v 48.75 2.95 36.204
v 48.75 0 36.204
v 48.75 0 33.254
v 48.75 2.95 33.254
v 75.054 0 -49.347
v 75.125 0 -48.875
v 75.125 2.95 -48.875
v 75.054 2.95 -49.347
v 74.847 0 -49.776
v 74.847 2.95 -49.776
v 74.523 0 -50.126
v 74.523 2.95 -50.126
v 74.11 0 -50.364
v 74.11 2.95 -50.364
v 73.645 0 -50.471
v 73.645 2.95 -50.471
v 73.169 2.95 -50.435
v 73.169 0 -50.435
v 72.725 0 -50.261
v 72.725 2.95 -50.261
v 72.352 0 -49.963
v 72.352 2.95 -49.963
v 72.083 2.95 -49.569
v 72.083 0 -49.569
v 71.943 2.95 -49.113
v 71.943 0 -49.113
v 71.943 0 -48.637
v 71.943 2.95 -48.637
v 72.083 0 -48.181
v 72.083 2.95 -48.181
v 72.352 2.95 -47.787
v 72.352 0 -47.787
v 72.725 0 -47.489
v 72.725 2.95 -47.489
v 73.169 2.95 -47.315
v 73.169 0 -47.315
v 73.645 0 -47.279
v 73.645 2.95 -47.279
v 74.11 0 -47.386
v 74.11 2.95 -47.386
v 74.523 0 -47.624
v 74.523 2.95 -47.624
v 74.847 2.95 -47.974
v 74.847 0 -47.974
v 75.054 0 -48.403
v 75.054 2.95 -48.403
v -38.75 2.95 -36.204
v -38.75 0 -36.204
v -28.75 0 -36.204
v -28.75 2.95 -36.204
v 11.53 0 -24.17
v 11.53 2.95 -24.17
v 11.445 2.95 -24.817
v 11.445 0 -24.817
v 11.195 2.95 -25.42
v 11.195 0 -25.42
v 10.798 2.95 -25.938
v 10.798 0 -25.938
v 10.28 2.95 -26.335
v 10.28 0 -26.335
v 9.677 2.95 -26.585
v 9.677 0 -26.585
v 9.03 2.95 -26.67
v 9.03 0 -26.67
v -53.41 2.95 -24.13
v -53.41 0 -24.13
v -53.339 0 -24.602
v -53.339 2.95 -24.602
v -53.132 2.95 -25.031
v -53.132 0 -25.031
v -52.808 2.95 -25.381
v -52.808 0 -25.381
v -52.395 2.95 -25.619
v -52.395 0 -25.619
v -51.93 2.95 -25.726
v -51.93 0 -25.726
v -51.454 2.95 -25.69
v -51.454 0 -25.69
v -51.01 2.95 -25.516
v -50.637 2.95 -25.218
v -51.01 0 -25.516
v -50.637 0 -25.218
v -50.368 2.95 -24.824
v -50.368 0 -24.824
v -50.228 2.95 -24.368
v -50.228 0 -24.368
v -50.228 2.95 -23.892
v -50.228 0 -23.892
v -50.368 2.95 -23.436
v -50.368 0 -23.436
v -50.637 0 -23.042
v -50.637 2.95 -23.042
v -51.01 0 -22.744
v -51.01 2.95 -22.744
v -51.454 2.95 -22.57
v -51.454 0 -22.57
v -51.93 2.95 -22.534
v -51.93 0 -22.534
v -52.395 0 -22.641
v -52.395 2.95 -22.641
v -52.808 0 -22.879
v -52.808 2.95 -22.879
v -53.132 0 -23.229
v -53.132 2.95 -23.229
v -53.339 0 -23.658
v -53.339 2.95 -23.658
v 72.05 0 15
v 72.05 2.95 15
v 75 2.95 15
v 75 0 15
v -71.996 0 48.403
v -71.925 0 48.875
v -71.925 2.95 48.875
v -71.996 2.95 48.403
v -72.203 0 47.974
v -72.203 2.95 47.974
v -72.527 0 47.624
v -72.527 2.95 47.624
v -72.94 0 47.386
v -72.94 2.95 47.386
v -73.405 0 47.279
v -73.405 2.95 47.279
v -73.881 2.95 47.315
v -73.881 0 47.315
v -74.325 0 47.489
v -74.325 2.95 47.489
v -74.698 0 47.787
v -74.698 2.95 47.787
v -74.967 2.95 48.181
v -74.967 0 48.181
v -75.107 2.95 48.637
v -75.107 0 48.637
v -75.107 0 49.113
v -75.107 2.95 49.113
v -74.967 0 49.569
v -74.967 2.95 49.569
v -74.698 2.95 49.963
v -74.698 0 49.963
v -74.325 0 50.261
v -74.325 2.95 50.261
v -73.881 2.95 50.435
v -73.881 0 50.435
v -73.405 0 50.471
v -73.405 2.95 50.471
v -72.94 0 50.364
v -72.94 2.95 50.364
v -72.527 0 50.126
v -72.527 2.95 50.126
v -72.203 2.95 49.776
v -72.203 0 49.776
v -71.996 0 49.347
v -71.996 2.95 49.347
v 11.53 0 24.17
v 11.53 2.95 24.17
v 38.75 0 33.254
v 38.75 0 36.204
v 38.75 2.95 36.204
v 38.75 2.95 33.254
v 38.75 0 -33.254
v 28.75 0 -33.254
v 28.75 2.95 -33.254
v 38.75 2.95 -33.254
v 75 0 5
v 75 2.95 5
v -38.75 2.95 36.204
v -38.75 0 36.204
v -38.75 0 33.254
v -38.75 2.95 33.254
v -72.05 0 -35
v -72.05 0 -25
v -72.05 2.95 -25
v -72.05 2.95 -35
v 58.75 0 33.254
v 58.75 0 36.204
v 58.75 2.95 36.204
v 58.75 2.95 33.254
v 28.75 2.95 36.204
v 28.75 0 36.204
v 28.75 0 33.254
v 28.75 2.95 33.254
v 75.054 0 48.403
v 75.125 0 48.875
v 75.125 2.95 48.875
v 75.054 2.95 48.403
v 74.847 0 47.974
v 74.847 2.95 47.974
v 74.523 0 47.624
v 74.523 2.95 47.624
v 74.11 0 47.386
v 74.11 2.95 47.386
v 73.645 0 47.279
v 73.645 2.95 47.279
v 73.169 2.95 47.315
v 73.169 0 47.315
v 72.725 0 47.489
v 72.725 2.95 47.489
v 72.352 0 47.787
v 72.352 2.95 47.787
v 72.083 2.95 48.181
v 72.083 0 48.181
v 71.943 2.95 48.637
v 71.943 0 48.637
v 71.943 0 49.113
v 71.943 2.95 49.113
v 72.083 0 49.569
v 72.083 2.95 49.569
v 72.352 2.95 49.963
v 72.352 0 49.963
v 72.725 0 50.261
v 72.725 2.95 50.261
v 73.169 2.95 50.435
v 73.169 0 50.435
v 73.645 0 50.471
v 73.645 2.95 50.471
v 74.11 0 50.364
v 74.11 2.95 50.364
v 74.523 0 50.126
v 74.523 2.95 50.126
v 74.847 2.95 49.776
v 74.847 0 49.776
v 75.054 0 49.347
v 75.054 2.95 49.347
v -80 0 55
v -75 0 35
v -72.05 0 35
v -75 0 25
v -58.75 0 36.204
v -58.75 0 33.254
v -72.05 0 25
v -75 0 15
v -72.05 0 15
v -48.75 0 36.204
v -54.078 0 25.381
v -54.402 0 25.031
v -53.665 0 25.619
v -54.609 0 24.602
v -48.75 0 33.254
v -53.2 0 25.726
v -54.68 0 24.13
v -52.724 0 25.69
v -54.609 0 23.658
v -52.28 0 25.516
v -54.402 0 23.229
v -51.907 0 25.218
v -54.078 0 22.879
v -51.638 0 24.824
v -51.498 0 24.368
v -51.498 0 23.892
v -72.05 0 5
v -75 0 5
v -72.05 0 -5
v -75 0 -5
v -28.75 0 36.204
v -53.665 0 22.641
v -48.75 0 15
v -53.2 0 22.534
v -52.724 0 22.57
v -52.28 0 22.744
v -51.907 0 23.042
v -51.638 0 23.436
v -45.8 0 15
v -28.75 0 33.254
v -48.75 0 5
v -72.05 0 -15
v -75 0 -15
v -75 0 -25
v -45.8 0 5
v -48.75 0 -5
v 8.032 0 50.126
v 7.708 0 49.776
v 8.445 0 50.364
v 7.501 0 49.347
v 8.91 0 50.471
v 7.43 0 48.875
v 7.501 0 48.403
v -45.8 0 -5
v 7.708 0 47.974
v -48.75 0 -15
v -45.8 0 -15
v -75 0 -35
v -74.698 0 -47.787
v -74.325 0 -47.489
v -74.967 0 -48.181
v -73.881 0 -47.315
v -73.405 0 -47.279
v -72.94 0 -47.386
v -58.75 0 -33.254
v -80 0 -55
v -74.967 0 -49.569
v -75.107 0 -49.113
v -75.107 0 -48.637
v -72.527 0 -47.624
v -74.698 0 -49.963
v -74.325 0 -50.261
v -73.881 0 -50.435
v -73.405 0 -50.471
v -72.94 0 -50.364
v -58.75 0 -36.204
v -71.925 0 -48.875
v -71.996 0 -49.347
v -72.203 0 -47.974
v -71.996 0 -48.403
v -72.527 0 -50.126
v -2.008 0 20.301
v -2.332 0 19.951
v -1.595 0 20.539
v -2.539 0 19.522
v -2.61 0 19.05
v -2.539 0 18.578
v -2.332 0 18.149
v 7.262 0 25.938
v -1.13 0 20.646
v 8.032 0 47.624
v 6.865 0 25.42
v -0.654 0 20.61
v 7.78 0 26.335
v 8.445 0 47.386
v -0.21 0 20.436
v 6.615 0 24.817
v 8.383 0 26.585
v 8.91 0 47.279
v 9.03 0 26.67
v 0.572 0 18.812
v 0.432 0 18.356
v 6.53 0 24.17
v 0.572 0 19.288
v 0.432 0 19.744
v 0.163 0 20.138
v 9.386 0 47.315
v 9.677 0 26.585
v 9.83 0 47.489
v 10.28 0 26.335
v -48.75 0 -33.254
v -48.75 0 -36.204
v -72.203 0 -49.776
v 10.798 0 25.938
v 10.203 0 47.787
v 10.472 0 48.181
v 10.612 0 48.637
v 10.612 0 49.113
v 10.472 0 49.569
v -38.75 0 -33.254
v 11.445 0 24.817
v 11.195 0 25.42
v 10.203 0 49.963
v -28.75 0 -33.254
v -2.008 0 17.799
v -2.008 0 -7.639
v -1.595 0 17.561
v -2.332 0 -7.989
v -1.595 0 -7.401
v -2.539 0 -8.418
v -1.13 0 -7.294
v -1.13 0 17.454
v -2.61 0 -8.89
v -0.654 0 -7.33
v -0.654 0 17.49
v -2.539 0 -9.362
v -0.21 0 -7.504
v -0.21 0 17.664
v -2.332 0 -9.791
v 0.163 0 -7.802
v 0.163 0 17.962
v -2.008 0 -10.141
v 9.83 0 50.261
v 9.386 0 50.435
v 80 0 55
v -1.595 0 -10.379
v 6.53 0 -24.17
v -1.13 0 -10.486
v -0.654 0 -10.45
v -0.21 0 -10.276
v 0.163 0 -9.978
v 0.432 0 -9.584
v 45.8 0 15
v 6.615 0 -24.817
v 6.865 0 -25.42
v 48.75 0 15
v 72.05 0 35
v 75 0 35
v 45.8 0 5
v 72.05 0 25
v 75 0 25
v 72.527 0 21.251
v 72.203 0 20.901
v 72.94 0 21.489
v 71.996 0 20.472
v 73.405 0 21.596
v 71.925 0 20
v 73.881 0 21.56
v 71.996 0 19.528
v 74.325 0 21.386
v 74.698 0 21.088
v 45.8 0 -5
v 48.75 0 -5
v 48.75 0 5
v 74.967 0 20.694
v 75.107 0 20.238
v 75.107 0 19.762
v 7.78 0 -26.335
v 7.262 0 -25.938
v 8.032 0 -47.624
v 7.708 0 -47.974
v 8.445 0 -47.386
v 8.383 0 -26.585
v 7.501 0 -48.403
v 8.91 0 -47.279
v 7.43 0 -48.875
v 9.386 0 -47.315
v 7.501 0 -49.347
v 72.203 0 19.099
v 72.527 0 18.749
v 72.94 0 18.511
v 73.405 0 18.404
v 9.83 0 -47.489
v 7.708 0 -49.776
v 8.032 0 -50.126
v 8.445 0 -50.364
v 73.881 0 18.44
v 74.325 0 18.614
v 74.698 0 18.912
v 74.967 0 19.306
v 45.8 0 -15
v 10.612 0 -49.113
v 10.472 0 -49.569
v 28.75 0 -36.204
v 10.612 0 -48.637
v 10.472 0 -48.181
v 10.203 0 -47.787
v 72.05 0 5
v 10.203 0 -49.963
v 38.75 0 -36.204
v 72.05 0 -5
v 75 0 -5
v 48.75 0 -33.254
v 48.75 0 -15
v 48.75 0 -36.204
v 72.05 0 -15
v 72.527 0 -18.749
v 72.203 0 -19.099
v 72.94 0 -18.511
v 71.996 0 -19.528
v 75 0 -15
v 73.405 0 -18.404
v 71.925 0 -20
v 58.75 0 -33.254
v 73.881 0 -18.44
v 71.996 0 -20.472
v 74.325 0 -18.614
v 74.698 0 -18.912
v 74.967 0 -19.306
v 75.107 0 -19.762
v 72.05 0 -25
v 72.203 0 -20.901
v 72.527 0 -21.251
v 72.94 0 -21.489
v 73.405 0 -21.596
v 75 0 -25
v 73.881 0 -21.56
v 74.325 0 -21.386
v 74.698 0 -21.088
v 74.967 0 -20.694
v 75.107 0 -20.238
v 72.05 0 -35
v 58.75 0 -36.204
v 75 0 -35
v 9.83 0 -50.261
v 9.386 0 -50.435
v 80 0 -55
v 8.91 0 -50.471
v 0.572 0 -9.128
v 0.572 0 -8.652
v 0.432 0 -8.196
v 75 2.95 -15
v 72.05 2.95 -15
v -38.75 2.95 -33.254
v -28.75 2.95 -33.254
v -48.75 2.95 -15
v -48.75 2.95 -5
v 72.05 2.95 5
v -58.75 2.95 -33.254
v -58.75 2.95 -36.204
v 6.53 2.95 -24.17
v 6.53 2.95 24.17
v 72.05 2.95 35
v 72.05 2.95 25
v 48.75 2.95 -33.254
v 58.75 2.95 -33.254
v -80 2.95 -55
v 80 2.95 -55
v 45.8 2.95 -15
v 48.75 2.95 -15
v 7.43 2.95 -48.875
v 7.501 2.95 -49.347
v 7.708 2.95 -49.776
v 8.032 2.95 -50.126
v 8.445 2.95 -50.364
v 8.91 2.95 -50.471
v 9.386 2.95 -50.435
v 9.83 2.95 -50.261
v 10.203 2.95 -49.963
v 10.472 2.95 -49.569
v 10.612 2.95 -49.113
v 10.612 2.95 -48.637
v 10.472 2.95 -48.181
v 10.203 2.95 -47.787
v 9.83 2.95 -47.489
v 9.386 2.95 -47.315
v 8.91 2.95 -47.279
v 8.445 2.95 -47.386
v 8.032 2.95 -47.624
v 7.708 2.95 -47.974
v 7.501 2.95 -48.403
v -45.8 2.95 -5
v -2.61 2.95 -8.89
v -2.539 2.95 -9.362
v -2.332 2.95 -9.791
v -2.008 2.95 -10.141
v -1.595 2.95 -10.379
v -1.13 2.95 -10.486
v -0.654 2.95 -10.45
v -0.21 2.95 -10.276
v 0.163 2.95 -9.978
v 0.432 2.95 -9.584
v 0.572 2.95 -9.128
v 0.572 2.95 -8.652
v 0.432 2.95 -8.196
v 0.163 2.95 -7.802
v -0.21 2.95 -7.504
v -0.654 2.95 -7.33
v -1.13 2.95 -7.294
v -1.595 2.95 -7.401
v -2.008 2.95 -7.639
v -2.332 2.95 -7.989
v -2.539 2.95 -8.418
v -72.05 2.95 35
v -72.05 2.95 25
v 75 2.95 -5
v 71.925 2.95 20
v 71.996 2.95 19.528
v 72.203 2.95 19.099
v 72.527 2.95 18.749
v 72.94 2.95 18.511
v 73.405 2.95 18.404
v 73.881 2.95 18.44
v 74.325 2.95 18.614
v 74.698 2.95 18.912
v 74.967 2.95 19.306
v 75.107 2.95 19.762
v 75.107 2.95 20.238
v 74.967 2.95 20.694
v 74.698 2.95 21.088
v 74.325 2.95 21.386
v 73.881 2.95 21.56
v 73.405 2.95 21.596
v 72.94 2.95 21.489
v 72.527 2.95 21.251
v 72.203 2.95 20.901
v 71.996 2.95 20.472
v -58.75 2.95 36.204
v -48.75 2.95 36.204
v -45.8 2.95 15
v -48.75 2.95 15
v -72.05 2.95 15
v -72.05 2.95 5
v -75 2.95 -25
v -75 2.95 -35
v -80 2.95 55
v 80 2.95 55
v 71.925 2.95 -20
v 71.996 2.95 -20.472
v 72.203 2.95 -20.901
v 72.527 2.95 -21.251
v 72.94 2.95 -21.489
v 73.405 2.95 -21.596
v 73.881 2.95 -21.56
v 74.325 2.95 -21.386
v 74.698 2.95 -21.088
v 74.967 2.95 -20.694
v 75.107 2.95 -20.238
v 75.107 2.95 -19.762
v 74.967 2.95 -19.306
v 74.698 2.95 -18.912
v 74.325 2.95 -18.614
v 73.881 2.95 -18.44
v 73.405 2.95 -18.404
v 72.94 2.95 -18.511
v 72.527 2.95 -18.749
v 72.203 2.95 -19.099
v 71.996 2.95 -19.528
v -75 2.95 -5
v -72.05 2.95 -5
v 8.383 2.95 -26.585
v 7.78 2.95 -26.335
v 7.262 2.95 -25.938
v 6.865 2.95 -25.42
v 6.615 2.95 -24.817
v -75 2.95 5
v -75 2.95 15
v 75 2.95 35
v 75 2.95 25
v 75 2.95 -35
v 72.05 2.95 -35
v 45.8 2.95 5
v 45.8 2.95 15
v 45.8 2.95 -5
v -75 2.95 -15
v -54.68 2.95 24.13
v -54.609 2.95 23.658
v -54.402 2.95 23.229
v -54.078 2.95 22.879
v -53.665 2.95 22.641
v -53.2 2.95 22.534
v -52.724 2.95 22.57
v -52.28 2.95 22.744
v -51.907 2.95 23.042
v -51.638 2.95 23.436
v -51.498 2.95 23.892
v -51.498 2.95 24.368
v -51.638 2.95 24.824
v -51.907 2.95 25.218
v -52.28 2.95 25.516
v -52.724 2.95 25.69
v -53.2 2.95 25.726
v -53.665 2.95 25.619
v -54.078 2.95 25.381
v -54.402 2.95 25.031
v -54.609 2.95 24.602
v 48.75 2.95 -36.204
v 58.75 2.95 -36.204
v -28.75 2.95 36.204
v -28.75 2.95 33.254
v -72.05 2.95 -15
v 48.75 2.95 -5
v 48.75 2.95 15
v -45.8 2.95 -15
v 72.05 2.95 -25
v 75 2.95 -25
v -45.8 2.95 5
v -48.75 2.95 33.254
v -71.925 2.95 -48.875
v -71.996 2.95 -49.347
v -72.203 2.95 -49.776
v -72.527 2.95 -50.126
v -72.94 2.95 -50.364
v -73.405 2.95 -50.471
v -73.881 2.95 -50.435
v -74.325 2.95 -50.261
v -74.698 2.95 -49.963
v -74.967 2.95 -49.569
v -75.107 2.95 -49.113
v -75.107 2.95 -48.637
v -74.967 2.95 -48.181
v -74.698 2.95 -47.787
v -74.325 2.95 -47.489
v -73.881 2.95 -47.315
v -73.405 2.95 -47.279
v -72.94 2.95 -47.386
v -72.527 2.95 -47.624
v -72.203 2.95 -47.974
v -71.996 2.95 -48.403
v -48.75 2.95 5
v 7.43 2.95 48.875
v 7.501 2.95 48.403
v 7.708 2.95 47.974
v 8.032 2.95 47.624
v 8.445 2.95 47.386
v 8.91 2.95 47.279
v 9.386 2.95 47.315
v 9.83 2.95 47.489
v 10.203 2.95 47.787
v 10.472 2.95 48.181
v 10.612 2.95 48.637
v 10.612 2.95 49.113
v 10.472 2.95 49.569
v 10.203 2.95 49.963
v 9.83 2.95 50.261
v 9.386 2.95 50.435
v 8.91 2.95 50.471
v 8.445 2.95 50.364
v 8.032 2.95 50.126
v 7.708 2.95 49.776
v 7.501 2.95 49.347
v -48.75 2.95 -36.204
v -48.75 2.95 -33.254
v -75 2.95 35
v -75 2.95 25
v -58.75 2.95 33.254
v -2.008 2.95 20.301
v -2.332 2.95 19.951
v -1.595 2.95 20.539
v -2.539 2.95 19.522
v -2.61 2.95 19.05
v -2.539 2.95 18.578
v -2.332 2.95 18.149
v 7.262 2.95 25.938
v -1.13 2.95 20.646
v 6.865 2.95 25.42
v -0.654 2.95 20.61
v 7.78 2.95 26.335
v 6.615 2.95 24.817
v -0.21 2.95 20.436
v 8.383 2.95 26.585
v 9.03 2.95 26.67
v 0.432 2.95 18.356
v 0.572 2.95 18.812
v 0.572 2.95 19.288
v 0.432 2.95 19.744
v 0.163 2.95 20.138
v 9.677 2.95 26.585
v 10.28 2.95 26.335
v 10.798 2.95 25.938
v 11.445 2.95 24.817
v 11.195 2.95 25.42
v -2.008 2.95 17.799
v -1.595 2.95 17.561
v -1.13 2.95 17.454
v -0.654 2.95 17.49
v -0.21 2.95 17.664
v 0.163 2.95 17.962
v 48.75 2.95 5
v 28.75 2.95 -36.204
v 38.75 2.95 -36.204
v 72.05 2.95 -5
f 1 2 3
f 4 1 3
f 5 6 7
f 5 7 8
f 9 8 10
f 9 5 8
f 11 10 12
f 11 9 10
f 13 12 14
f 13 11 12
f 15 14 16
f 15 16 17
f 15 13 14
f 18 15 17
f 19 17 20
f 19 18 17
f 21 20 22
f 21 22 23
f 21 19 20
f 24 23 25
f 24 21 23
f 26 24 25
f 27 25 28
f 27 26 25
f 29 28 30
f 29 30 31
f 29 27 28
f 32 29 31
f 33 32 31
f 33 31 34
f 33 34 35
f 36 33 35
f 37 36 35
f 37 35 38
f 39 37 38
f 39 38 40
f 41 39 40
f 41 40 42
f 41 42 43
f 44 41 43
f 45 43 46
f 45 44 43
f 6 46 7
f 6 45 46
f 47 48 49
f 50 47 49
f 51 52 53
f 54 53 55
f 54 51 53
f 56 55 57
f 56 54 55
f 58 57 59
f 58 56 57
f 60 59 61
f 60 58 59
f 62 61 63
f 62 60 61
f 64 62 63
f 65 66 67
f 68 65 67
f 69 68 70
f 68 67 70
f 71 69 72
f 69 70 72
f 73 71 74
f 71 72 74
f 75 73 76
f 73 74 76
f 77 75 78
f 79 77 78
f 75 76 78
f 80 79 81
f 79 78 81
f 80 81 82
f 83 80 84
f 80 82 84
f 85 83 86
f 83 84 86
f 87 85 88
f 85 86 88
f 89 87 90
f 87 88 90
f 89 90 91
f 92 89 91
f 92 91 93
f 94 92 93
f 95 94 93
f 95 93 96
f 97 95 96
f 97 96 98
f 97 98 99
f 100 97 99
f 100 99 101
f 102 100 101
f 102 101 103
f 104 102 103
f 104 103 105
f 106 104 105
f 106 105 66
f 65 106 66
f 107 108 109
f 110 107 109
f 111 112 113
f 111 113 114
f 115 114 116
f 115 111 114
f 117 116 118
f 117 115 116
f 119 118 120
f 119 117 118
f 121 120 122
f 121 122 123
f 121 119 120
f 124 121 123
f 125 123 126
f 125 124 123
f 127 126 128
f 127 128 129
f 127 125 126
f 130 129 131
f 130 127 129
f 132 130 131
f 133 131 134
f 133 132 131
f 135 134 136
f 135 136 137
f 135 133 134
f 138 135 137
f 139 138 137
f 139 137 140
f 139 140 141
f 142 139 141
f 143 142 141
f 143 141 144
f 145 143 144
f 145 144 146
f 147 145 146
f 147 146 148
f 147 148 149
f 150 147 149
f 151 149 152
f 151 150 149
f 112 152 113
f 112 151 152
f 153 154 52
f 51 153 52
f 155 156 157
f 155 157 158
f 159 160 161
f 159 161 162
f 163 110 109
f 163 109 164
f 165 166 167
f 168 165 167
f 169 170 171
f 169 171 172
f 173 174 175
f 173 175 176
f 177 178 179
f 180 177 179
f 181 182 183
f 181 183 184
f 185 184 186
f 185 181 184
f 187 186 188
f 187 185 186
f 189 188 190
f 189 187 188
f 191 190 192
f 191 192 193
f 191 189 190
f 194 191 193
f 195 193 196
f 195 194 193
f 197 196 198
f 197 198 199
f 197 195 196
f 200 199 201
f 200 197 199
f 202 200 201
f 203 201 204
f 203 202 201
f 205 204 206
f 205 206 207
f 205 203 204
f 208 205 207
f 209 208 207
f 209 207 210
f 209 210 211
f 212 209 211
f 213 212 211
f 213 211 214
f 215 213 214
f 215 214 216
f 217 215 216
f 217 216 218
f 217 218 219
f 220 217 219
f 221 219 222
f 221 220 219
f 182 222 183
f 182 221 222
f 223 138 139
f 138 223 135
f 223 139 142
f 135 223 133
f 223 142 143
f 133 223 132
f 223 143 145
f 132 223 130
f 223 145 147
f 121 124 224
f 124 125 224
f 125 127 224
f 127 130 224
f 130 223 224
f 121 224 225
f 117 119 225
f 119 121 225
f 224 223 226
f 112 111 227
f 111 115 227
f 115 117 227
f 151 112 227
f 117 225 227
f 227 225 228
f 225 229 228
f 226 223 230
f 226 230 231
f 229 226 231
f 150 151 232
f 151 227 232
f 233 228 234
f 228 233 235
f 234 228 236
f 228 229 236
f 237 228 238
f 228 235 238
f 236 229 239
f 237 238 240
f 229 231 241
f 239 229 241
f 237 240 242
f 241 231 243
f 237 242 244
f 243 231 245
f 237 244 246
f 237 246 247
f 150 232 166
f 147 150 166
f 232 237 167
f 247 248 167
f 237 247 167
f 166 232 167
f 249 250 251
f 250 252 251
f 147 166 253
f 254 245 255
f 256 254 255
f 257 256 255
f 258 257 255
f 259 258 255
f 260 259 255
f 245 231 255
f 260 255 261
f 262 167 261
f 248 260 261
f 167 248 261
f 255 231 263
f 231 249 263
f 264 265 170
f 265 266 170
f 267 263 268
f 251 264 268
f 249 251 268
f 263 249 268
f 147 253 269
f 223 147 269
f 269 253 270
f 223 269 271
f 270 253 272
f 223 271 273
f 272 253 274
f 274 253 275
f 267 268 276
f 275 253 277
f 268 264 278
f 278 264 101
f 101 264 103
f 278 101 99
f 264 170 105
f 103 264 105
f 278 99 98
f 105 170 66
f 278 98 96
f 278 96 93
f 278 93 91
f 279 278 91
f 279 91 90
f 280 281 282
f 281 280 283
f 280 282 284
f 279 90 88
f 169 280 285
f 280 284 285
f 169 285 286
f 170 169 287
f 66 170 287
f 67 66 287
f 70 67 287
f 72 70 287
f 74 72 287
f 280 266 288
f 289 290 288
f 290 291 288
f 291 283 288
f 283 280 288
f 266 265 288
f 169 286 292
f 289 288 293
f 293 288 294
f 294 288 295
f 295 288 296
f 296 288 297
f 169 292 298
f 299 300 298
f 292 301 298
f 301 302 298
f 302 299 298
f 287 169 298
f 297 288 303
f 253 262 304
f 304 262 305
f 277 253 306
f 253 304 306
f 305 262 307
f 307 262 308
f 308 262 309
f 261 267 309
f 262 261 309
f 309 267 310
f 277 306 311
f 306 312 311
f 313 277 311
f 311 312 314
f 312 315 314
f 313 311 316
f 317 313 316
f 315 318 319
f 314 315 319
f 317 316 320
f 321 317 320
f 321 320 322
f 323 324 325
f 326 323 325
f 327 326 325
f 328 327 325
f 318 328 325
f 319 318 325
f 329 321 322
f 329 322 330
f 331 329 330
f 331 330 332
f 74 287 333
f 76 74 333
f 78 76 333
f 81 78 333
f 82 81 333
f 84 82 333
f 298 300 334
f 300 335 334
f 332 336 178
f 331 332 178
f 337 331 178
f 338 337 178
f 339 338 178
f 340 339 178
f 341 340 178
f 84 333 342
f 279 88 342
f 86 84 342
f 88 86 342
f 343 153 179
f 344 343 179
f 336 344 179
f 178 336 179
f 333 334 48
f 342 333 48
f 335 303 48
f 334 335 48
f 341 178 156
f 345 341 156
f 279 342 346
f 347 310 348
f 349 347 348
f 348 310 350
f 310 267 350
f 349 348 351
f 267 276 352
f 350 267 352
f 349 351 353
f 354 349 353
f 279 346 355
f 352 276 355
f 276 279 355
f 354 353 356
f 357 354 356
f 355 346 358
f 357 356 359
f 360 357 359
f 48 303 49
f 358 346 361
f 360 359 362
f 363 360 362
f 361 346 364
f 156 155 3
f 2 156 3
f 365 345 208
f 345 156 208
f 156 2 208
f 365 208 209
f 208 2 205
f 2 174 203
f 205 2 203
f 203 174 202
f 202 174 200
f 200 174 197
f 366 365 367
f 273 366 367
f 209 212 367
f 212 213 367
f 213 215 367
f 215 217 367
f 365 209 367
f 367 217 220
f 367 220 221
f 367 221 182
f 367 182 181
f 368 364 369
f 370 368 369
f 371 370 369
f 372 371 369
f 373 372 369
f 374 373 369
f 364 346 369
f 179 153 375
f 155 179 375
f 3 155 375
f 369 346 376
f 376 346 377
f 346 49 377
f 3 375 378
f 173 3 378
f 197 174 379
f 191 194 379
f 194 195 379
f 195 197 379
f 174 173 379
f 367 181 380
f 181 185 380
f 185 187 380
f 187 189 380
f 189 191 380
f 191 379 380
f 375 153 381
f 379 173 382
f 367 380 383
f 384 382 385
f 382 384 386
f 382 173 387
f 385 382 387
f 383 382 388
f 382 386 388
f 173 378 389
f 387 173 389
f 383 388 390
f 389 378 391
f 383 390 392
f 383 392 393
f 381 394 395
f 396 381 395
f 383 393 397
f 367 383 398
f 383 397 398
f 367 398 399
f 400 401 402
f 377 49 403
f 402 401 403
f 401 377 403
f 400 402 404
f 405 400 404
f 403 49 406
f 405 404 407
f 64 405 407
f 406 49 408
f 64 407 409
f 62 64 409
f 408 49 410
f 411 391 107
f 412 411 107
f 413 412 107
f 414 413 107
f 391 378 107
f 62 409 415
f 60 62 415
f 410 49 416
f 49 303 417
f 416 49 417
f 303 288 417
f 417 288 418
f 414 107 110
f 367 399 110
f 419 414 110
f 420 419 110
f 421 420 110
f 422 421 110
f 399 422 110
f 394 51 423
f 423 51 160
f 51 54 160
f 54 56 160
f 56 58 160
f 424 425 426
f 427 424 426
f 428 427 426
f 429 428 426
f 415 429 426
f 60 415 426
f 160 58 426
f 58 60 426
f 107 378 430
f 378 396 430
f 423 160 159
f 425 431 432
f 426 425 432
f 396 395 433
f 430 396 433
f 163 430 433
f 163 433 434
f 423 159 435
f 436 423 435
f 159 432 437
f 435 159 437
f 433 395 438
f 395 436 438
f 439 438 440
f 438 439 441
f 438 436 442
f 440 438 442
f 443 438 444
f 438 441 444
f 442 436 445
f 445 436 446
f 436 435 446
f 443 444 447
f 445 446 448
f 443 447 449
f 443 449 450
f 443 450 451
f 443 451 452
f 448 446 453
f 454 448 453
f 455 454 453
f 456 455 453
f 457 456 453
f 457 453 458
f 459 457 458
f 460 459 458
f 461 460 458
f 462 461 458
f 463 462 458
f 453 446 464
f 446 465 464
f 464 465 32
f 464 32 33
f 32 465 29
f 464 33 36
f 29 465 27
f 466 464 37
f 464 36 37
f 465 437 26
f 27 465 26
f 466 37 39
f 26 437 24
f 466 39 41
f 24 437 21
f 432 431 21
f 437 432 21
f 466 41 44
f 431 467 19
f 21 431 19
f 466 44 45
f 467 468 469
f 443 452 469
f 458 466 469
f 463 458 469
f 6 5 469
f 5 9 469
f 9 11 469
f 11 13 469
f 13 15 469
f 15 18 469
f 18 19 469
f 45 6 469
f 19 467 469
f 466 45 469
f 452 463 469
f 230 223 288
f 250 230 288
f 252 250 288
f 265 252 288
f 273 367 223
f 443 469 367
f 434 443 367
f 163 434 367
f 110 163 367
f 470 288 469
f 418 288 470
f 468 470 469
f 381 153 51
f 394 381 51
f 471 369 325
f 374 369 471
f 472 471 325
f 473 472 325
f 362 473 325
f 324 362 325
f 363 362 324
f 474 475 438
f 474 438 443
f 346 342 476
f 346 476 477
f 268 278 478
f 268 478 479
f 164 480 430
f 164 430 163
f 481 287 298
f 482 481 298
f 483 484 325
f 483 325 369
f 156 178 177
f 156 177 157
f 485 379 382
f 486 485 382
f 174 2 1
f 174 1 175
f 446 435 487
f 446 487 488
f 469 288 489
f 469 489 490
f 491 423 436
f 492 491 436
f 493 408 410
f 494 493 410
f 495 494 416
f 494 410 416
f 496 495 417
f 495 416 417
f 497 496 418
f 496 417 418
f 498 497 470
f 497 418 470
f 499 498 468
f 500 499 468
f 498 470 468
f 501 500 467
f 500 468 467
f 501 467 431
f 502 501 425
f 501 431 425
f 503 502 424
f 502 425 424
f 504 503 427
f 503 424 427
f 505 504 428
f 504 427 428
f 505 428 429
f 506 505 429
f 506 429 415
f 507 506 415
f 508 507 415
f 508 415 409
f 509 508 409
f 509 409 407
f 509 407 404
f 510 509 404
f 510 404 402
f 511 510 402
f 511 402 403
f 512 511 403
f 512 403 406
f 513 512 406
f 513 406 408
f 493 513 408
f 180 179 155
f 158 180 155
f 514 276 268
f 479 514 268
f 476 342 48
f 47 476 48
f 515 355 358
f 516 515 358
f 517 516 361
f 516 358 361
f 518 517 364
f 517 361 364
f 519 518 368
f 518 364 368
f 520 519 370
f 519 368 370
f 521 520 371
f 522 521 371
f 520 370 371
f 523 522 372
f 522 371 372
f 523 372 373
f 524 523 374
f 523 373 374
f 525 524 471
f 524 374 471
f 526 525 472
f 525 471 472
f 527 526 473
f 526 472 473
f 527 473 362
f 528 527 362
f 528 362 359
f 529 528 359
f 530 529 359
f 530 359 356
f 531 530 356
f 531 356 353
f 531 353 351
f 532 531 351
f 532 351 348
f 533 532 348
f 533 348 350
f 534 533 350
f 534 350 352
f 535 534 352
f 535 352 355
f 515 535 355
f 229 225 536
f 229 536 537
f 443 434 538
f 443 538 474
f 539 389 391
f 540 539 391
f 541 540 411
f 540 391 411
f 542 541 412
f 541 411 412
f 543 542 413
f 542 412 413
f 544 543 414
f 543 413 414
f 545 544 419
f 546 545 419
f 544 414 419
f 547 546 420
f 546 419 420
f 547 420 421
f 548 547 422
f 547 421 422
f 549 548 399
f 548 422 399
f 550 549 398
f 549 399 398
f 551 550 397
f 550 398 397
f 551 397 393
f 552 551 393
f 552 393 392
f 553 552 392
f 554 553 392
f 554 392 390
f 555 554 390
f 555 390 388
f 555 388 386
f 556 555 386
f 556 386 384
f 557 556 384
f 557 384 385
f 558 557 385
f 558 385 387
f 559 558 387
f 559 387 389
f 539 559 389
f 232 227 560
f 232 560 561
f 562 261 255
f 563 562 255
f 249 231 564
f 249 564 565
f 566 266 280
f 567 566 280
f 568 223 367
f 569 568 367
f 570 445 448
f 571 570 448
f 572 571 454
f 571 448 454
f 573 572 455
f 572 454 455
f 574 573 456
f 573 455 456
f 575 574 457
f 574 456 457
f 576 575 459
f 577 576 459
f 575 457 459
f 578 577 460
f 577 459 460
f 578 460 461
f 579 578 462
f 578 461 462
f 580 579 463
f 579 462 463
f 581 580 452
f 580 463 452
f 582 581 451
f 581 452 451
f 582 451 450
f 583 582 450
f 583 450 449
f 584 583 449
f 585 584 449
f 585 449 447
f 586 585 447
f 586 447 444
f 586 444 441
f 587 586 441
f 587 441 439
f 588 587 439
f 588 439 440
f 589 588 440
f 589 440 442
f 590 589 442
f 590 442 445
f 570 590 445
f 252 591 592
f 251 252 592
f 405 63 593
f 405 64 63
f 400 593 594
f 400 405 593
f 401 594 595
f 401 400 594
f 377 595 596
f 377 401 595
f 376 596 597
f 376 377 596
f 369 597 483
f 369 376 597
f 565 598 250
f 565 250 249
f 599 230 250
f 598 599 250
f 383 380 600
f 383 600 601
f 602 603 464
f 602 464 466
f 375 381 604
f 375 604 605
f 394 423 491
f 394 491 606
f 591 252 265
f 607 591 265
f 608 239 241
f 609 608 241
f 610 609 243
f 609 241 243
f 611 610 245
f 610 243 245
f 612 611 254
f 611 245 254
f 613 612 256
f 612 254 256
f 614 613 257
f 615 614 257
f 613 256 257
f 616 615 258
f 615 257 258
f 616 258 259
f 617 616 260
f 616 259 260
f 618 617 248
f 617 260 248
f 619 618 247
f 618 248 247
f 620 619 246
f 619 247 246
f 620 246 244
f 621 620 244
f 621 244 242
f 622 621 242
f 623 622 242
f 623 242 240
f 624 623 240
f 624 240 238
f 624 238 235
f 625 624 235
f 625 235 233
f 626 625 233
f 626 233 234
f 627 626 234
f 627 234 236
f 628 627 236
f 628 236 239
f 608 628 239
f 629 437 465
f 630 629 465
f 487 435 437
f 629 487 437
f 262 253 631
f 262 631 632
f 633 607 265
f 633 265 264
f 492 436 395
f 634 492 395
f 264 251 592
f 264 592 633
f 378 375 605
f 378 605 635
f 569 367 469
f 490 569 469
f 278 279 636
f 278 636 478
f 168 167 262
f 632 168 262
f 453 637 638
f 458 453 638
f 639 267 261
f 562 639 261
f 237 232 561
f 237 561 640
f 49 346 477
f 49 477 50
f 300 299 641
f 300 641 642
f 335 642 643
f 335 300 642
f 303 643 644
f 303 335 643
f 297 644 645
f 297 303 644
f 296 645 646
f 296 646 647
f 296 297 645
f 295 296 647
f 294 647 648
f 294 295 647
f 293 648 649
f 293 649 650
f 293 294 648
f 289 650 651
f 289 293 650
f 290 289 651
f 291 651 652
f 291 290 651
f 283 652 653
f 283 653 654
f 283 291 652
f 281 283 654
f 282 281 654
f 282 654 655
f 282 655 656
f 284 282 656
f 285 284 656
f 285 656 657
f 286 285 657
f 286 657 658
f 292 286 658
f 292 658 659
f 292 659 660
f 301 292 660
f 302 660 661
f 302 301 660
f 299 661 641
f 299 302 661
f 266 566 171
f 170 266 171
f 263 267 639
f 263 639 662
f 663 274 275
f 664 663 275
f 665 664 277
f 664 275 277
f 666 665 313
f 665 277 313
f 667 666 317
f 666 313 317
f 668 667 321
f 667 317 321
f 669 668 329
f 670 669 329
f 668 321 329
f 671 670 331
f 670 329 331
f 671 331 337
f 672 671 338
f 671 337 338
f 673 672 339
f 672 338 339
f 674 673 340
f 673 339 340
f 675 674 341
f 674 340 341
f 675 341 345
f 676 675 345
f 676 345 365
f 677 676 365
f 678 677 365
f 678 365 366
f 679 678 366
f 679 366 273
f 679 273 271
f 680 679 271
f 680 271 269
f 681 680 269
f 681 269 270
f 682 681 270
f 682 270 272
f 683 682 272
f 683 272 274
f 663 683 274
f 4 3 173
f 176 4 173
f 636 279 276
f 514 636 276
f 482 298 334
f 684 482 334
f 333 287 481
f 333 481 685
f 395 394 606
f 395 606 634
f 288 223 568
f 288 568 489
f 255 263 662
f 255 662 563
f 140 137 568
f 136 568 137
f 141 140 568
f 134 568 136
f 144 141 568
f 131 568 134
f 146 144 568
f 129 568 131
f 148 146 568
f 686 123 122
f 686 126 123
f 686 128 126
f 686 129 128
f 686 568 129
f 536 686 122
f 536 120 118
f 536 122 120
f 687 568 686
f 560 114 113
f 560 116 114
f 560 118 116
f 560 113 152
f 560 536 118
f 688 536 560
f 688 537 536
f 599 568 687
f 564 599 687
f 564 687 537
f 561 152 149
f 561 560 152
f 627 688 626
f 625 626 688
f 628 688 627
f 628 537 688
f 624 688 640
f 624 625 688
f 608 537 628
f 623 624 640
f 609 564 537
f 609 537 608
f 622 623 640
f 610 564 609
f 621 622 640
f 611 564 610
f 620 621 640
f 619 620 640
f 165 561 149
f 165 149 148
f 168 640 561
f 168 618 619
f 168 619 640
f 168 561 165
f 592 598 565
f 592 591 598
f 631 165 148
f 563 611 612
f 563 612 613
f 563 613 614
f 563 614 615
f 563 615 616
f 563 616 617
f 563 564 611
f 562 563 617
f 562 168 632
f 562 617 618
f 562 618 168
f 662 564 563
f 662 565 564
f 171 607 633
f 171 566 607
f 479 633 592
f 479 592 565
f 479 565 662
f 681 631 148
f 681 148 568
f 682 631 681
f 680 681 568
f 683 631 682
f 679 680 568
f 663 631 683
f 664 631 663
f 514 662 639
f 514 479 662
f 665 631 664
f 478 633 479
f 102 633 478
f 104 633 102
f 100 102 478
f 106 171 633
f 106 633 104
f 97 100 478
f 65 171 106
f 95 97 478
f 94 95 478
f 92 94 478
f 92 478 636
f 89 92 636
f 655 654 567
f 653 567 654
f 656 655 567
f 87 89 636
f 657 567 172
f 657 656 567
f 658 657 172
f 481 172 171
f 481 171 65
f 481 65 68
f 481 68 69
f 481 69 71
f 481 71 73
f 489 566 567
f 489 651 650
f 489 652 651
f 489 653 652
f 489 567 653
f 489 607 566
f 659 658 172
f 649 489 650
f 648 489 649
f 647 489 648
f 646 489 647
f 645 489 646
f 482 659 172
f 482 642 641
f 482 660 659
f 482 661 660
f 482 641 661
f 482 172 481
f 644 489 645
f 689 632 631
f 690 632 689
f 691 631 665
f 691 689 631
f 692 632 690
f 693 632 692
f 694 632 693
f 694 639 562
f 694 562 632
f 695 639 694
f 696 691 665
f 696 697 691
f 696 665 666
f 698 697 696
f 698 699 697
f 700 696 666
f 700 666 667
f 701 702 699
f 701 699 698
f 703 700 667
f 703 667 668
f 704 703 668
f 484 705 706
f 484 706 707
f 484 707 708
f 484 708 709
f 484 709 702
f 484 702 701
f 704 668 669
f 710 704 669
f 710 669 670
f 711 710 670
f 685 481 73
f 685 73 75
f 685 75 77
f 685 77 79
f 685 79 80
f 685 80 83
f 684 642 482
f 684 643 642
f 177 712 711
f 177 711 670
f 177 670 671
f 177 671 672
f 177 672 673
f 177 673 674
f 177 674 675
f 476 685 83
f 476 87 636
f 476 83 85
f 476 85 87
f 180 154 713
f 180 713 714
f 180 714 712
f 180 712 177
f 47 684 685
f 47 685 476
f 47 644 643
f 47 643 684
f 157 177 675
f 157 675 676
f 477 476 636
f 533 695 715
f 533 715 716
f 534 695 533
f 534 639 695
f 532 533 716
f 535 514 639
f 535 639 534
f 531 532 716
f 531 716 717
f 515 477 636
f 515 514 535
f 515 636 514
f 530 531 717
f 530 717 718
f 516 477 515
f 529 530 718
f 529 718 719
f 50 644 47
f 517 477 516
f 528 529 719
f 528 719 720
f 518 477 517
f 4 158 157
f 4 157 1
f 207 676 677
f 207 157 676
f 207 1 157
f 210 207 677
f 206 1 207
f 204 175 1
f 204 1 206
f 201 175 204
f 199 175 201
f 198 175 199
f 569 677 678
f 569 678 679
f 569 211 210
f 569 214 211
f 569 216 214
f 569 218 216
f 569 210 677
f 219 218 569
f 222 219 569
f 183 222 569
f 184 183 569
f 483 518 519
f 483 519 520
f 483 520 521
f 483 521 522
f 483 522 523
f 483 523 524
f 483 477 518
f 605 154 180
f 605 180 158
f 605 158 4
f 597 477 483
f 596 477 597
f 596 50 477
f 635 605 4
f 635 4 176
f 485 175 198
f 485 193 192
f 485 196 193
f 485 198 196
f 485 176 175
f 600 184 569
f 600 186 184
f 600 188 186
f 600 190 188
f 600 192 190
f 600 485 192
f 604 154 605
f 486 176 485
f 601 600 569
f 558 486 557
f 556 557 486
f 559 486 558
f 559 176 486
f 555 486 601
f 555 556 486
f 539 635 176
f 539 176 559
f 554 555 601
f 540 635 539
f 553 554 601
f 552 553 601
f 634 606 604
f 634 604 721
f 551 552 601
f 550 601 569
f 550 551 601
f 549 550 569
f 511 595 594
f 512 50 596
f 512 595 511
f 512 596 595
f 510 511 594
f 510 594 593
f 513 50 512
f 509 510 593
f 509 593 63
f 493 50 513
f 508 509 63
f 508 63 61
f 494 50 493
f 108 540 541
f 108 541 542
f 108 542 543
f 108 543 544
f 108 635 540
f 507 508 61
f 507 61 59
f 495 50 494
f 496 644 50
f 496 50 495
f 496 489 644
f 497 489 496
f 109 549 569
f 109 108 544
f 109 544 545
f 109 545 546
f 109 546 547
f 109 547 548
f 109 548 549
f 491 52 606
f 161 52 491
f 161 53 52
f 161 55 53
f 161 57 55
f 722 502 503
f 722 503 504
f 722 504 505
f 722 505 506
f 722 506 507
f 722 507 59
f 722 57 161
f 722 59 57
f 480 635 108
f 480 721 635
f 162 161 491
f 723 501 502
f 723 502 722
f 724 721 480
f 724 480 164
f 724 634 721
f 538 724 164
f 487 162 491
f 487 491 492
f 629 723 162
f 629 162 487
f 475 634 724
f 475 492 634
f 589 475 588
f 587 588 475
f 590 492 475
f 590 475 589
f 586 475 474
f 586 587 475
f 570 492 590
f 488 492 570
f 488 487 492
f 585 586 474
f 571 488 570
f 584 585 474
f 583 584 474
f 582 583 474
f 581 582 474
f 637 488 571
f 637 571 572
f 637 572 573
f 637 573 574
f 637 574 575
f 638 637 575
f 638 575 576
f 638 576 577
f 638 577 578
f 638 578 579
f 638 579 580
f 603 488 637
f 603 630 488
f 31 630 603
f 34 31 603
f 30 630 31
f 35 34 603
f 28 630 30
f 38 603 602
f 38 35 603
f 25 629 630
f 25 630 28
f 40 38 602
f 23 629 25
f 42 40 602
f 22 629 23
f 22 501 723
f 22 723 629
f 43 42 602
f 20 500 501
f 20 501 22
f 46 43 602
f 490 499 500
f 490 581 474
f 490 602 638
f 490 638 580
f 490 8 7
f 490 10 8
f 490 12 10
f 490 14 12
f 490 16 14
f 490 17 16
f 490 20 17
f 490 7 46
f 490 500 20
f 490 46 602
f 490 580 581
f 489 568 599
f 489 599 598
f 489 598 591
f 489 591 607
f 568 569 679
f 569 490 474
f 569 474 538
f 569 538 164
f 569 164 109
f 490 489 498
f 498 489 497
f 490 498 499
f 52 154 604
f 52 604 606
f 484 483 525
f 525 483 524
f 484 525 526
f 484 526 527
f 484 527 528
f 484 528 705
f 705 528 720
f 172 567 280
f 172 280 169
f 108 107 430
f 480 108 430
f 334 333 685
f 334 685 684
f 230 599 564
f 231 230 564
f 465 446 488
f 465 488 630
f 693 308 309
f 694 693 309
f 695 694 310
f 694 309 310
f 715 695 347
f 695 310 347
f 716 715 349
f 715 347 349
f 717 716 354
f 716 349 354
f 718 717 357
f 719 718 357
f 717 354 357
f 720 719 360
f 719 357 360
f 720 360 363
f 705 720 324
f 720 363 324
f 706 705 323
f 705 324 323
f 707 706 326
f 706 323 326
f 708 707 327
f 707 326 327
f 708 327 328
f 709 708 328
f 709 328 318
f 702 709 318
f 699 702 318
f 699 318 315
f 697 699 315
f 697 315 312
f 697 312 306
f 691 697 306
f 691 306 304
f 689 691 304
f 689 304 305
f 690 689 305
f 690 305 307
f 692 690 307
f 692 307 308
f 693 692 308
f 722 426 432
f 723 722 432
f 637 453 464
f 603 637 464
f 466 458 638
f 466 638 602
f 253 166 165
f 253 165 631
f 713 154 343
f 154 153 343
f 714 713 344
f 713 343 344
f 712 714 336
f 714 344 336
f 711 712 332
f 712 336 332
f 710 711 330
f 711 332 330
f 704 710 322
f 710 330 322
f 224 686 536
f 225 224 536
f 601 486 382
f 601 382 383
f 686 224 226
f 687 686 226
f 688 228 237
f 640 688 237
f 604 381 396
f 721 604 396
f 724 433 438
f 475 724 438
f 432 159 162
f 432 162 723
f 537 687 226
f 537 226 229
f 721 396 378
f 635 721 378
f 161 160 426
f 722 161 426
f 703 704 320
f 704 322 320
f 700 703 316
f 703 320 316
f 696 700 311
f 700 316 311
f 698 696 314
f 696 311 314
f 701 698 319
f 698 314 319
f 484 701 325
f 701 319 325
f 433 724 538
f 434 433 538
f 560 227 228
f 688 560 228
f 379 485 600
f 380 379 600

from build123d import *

# Parameters (mm, degrees)
BOTTOM_PLATE_OUTLINE_W   = 160
BOTTOM_PLATE_OUTLINE_H   = 110
BOTTOM_PLATE_OUTLINE_R   = 1.6
BOTTOM_PLATE_OUTLINE_W_2 = 2.95
BOTTOM_PLATE_OUTLINE_H_2 = 10
BOTTOM_PLATE_OUTLINE_W_3 = 10
BOTTOM_PLATE_OUTLINE_H_3 = 2.95
BOTTOM_PLATE_DEPTH       = 2.95
M3_CLEARANCE_HOLE1_D     = 3.2
SKETCH6_W                = 5
SKETCH6_H                = 53.34
CUT_EXTRUDE1_DEPTH       = 98.127249009
FILLET1_R                = 2.5
FILLET2_R                = 2.5
M3_CLEARANCE_HOLE2_D     = 3.2
M3_CLEARANCE_HOLE3_D     = 3.2
SKETCH12_W               = 2.95
SKETCH12_H               = 10
CUT_EXTRUDE4_DEPTH       = 98.127249009


# Read off the part's stored shape, not the designer's step: Bottom Plate
with BuildPart() as part:
    # Bottom Plate outline → Bottom Plate (new body)
    with BuildSketch(Plane(origin=(0, 0, 0), x_dir=(1, 0, 0), z_dir=(0, 1, 0))):
        Rectangle(BOTTOM_PLATE_OUTLINE_W, BOTTOM_PLATE_OUTLINE_H)
        with Locations((-73.525, -48.875)):
            Circle(BOTTOM_PLATE_OUTLINE_R, mode=Mode.SUBTRACT)
        with Locations((-73.525, -30)):
            Rectangle(BOTTOM_PLATE_OUTLINE_W_2, BOTTOM_PLATE_OUTLINE_H_2, mode=Mode.SUBTRACT)
        with Locations((-53.75, -34.729)):
            Rectangle(BOTTOM_PLATE_OUTLINE_W_3, BOTTOM_PLATE_OUTLINE_H_3, mode=Mode.SUBTRACT)
        with Locations((-33.75, -34.729)):
            Rectangle(BOTTOM_PLATE_OUTLINE_W_3, BOTTOM_PLATE_OUTLINE_H_3, mode=Mode.SUBTRACT)
        with Locations((-73.525, -10)):
            Rectangle(BOTTOM_PLATE_OUTLINE_W_2, BOTTOM_PLATE_OUTLINE_H_2, mode=Mode.SUBTRACT)
        with Locations((33.75, -34.729)):
            Rectangle(BOTTOM_PLATE_OUTLINE_W_3, BOTTOM_PLATE_OUTLINE_H_3, mode=Mode.SUBTRACT)
        with Locations((73.525, -48.875)):
            Circle(BOTTOM_PLATE_OUTLINE_R, mode=Mode.SUBTRACT)
        with Locations((53.75, -34.729)):
            Rectangle(BOTTOM_PLATE_OUTLINE_W_3, BOTTOM_PLATE_OUTLINE_H_3, mode=Mode.SUBTRACT)
        with Locations((73.525, -30)):
            Rectangle(BOTTOM_PLATE_OUTLINE_W_2, BOTTOM_PLATE_OUTLINE_H_2, mode=Mode.SUBTRACT)
        with Locations((73.525, -10)):
            Rectangle(BOTTOM_PLATE_OUTLINE_W_2, BOTTOM_PLATE_OUTLINE_H_2, mode=Mode.SUBTRACT)
        with Locations((-73.525, 10)):
            Rectangle(BOTTOM_PLATE_OUTLINE_W_2, BOTTOM_PLATE_OUTLINE_H_2, mode=Mode.SUBTRACT)
        with Locations((-73.525, 30)):
            Rectangle(BOTTOM_PLATE_OUTLINE_W_2, BOTTOM_PLATE_OUTLINE_H_2, mode=Mode.SUBTRACT)
        with Locations((-53.75, 34.729)):
            Rectangle(BOTTOM_PLATE_OUTLINE_W_3, BOTTOM_PLATE_OUTLINE_H_3, mode=Mode.SUBTRACT)
        with Locations((-73.525, 48.875)):
            Circle(BOTTOM_PLATE_OUTLINE_R, mode=Mode.SUBTRACT)
        with Locations((-33.75, 34.729)):
            Rectangle(BOTTOM_PLATE_OUTLINE_W_3, BOTTOM_PLATE_OUTLINE_H_3, mode=Mode.SUBTRACT)
        with Locations((73.525, 10)):
            Rectangle(BOTTOM_PLATE_OUTLINE_W_2, BOTTOM_PLATE_OUTLINE_H_2, mode=Mode.SUBTRACT)
        with Locations((33.75, 34.729)):
            Rectangle(BOTTOM_PLATE_OUTLINE_W_3, BOTTOM_PLATE_OUTLINE_H_3, mode=Mode.SUBTRACT)
        with Locations((53.75, 34.729)):
            Rectangle(BOTTOM_PLATE_OUTLINE_W_3, BOTTOM_PLATE_OUTLINE_H_3, mode=Mode.SUBTRACT)
        with Locations((73.525, 30)):
            Rectangle(BOTTOM_PLATE_OUTLINE_W_2, BOTTOM_PLATE_OUTLINE_H_2, mode=Mode.SUBTRACT)
        with Locations((73.525, 48.875)):
            Circle(BOTTOM_PLATE_OUTLINE_R, mode=Mode.SUBTRACT)
    extrude(amount=BOTTOM_PLATE_DEPTH)

    # M3 Clearance Hole1 (through all)
    with Locations(Plane(origin=(0, 2.95, 0), x_dir=(1, 0, 0), z_dir=(0, 1, 0))):
        with Locations((-51.81, 24.13), (-53.08, -24.13), (-1.01, -19.05), (-1.01, 8.89)):
            Hole(M3_CLEARANCE_HOLE1_D / 2)

    # Sketch6 → Cut-Extrude1 (cut, through all)
    with BuildSketch(Plane(origin=(0, 2.95, 0), x_dir=(1, 0, 0), z_dir=(0, 1, 0))):
        with Locations((9.03, 0)):
            Rectangle(SKETCH6_W, SKETCH6_H)
    extrude(amount=-CUT_EXTRUDE1_DEPTH, mode=Mode.SUBTRACT)

    # Fillet1
    fillet1_edges = [part.edges().sort_by_distance(p)[0] for p in [
        (6.53, 1.475, -26.67),
        (11.53, 1.475, -26.67),
    ]]
    fillet(fillet1_edges, radius=FILLET1_R - 0.0001)  # a hair under: the kernel refuses the full size

    # Fillet2
    fillet2_edges = [part.edges().sort_by_distance(p)[0] for p in [
        (6.53, 1.475, 26.67),
        (11.53, 1.475, 26.67),
    ]]
    fillet(fillet2_edges, radius=FILLET2_R - 0.0001)  # a hair under: the kernel refuses the full size

    # M3 Clearance Hole2 (through all)
    with Locations(Plane(origin=(0, 2.95, 0), x_dir=(1, 0, 0), z_dir=(0, 1, 0))):
        with Locations((73.525, -20), (73.525, 20)):
            Hole(M3_CLEARANCE_HOLE2_D / 2)

    # M3 Clearance Hole3 (through all)
    with Locations(Plane(origin=(0, 2.95, 0), x_dir=(1, 0, 0), z_dir=(0, 1, 0))):
        with Locations((9.03, -48.875), (9.03, 48.875)):
            Hole(M3_CLEARANCE_HOLE3_D / 2)

    # Sketch12 → Cut-Extrude4 (cut, through all)
    with BuildSketch(Plane.XZ):
        with Locations((47.275, 10)):
            Rectangle(SKETCH12_W, SKETCH12_H)
        with Locations((47.275, -10)):
            Rectangle(SKETCH12_W, SKETCH12_H)
    cut_extrude4 = extrude(amount=-CUT_EXTRUDE4_DEPTH, mode=Mode.SUBTRACT)

    # Mirror1: Cut-Extrude4 across plane
    add(cut_extrude4.mirror(Plane(origin=(0, 0, 0), x_dir=(0, 0, 1), z_dir=(1, 0, 0))), mode=Mode.SUBTRACT)


solid = part.part
